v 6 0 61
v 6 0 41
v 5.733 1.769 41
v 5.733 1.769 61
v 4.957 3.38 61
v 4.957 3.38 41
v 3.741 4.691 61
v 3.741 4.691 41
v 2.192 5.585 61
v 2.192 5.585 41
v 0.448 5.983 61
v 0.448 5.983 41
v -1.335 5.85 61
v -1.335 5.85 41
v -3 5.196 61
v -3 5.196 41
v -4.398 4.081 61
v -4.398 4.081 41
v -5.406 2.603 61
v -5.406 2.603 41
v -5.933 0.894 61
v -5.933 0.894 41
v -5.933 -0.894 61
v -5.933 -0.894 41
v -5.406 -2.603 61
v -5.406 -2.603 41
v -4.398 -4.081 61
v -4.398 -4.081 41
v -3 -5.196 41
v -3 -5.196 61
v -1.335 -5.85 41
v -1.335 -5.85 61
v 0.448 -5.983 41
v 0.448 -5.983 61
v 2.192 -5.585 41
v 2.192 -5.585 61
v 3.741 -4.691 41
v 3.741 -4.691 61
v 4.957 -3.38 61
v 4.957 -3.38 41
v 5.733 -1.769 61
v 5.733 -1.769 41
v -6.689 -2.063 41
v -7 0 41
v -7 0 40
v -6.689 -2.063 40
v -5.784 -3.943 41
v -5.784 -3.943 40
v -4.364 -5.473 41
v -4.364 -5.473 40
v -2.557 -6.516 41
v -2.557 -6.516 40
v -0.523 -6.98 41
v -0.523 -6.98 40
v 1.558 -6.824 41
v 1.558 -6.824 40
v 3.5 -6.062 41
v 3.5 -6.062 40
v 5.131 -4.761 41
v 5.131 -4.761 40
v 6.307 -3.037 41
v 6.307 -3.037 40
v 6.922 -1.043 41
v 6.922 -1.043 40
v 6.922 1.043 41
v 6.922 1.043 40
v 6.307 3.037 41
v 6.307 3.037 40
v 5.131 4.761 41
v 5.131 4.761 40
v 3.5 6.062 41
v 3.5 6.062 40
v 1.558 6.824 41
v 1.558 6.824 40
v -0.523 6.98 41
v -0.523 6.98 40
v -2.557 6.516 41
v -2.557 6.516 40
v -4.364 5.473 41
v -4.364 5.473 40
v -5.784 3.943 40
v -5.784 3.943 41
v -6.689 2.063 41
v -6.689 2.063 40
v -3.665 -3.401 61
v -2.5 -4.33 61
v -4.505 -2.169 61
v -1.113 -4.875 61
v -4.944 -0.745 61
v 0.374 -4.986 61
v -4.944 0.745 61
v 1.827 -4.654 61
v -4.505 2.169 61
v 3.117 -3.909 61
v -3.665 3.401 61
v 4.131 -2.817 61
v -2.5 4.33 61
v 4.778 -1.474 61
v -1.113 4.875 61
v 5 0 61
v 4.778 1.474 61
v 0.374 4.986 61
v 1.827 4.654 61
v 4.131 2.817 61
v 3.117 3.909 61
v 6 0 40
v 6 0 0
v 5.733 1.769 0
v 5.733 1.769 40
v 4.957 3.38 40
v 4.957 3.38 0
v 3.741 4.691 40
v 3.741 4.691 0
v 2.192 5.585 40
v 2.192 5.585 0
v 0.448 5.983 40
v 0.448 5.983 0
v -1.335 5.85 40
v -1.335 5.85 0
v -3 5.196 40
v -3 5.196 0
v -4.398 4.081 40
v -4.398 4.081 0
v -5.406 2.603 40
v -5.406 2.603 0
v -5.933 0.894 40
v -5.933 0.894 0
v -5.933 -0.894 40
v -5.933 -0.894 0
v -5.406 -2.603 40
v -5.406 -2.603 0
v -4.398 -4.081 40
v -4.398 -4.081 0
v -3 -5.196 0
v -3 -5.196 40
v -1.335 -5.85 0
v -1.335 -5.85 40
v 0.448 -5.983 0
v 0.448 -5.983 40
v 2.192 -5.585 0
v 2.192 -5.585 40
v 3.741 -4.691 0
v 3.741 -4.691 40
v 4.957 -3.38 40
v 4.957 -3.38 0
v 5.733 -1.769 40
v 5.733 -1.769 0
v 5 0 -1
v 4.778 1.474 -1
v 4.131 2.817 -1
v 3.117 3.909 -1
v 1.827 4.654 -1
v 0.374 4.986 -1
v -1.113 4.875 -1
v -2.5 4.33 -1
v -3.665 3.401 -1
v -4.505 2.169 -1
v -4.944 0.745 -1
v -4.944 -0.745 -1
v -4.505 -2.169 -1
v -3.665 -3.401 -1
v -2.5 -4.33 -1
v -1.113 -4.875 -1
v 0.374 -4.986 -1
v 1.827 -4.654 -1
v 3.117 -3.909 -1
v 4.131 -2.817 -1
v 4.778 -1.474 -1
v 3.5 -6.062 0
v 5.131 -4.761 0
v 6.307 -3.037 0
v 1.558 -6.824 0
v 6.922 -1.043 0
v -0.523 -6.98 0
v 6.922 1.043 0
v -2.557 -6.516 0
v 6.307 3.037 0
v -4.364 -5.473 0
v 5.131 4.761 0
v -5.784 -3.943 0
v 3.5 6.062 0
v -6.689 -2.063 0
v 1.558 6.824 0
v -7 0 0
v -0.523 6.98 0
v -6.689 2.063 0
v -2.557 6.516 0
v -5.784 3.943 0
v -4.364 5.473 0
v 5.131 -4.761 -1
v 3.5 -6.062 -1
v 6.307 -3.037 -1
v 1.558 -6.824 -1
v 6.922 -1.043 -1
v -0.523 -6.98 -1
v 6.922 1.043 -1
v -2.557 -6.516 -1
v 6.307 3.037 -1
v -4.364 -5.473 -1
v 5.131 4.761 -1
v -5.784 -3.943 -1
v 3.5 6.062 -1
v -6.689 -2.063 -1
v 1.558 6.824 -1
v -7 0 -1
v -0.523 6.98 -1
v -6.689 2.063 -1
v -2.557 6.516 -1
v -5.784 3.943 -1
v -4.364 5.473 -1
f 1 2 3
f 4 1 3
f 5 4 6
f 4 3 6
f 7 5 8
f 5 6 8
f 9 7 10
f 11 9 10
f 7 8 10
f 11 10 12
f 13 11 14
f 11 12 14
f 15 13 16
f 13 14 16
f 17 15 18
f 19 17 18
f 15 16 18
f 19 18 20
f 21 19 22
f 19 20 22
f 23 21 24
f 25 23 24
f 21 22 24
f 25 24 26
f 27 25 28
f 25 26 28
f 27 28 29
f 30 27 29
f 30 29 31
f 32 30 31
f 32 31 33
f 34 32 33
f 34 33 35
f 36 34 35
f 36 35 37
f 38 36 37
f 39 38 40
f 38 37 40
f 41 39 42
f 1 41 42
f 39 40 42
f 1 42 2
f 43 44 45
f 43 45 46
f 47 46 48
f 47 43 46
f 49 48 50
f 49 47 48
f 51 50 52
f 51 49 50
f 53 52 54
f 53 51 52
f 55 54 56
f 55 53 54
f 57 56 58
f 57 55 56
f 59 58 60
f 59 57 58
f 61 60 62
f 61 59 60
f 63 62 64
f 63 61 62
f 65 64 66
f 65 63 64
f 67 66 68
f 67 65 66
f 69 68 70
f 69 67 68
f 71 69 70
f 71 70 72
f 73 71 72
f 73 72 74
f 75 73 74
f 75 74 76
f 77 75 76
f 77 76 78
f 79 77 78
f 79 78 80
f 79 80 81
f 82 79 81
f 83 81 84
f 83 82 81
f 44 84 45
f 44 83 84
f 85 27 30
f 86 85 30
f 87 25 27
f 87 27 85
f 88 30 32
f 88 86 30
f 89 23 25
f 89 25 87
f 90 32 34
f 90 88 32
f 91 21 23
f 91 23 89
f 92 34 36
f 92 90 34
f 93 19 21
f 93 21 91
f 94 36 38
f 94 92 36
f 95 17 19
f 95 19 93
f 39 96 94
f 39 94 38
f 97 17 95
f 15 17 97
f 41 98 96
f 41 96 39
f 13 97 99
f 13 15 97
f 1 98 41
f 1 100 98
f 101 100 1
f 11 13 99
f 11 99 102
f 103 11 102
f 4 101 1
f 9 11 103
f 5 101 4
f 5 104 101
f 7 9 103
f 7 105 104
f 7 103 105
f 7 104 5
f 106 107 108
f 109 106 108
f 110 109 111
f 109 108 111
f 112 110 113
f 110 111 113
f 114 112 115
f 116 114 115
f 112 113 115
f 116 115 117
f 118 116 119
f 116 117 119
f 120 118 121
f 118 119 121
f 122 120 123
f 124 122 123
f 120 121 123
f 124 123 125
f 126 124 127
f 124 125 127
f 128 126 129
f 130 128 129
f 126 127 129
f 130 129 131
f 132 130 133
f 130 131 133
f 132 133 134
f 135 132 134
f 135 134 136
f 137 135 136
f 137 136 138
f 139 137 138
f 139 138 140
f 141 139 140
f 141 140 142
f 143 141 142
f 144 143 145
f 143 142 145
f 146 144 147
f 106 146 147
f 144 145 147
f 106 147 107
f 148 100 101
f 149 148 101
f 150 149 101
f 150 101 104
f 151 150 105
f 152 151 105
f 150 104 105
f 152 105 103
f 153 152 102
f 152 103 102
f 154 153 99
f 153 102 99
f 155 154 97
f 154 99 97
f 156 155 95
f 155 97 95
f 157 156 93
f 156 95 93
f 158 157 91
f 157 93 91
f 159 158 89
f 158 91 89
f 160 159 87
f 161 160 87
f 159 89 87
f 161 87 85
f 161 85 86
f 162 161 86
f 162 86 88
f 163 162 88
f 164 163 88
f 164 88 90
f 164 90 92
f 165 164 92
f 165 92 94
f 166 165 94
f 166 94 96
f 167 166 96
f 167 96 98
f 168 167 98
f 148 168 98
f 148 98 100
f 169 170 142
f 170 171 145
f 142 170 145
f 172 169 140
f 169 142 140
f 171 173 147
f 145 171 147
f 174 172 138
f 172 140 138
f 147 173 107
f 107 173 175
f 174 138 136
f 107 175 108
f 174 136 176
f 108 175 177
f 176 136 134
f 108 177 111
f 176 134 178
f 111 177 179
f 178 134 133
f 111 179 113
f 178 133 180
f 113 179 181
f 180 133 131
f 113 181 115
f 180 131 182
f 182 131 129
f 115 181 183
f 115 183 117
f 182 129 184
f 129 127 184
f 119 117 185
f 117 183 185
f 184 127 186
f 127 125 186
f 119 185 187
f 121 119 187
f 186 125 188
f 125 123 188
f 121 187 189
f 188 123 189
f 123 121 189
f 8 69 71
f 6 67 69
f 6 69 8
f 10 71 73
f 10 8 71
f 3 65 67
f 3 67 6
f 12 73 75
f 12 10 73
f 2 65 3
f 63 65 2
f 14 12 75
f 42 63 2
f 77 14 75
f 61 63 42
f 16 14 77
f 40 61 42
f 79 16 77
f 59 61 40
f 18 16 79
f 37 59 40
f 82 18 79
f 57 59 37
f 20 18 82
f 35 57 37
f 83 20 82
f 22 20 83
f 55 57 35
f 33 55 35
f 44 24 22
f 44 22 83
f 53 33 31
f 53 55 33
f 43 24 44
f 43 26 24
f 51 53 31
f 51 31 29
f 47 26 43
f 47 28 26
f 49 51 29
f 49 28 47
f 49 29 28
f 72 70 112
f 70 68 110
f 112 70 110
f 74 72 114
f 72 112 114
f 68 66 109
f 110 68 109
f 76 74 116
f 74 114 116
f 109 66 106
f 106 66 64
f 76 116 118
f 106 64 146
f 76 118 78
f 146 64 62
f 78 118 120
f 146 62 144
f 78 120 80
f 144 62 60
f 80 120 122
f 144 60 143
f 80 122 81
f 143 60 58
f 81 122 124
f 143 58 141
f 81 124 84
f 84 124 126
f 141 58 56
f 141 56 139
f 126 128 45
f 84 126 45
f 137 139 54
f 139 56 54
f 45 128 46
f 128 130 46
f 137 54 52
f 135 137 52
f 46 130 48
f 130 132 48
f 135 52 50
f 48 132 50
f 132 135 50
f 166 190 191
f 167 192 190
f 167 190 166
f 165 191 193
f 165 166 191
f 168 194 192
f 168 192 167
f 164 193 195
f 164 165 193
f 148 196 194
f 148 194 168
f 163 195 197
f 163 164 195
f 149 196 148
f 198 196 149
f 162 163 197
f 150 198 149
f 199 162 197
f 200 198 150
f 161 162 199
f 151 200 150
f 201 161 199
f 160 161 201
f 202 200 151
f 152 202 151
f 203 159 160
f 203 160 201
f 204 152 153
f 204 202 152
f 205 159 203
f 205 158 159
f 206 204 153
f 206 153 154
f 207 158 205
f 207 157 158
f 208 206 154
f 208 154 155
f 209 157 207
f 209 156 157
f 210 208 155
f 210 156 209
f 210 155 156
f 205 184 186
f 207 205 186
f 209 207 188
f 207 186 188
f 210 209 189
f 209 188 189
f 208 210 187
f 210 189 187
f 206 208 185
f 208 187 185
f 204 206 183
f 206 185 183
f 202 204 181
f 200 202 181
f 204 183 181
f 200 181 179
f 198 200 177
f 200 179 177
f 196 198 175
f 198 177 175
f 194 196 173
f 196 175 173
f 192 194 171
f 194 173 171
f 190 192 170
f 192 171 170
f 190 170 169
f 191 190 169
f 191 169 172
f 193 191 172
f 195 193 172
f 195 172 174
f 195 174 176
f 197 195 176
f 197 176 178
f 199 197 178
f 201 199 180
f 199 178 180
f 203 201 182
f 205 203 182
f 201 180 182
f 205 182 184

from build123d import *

# Parameters (mm, degrees)
SKETCH1_R           = 6
BOSS_EXTRUDE1_DEPTH = 40
SKETCH2_R           = 7
BOSS_EXTRUDE2_DEPTH = 1
BOSS_EXTRUDE3_START = 1
SKETCH3_R           = 7
BOSS_EXTRUDE3_DEPTH = 1
SKETCH4_R           = 6
BOSS_EXTRUDE4_DEPTH = 20
SKETCH5_R           = 5
CUT_EXTRUDE1_DEPTH  = 200


with BuildPart() as part:
    # Sketch1 → Boss-Extrude1 (new body)
    with BuildSketch(Plane.XY):
        Circle(SKETCH1_R)
    extrude(amount=BOSS_EXTRUDE1_DEPTH)

    # Sketch2 → Boss-Extrude2 (add)
    with BuildSketch(Plane(origin=(0, 0, 0), x_dir=(-1, 0, 0), z_dir=(0, 0, -1))):
        Circle(SKETCH2_R)
    extrude(amount=BOSS_EXTRUDE2_DEPTH)

    # Sketch3 → Boss-Extrude3 (add)
    with BuildSketch(Plane.XY.offset(40).offset(BOSS_EXTRUDE3_START)):
        with Locations(Location((0, 0, 0), (0, 0, 180))):
            Circle(SKETCH3_R)
    extrude(amount=-BOSS_EXTRUDE3_DEPTH)

    # Sketch4 → Boss-Extrude4 (add)
    with BuildSketch(Plane.XY.offset(41)):
        Circle(SKETCH4_R)
    extrude(amount=BOSS_EXTRUDE4_DEPTH)

    # Sketch5 → Cut-Extrude1 (cut)
    with BuildSketch(Plane.XY.offset(61)):
        Circle(SKETCH5_R)
    extrude(amount=-CUT_EXTRUDE1_DEPTH, mode=Mode.SUBTRACT)


solid = part.part
